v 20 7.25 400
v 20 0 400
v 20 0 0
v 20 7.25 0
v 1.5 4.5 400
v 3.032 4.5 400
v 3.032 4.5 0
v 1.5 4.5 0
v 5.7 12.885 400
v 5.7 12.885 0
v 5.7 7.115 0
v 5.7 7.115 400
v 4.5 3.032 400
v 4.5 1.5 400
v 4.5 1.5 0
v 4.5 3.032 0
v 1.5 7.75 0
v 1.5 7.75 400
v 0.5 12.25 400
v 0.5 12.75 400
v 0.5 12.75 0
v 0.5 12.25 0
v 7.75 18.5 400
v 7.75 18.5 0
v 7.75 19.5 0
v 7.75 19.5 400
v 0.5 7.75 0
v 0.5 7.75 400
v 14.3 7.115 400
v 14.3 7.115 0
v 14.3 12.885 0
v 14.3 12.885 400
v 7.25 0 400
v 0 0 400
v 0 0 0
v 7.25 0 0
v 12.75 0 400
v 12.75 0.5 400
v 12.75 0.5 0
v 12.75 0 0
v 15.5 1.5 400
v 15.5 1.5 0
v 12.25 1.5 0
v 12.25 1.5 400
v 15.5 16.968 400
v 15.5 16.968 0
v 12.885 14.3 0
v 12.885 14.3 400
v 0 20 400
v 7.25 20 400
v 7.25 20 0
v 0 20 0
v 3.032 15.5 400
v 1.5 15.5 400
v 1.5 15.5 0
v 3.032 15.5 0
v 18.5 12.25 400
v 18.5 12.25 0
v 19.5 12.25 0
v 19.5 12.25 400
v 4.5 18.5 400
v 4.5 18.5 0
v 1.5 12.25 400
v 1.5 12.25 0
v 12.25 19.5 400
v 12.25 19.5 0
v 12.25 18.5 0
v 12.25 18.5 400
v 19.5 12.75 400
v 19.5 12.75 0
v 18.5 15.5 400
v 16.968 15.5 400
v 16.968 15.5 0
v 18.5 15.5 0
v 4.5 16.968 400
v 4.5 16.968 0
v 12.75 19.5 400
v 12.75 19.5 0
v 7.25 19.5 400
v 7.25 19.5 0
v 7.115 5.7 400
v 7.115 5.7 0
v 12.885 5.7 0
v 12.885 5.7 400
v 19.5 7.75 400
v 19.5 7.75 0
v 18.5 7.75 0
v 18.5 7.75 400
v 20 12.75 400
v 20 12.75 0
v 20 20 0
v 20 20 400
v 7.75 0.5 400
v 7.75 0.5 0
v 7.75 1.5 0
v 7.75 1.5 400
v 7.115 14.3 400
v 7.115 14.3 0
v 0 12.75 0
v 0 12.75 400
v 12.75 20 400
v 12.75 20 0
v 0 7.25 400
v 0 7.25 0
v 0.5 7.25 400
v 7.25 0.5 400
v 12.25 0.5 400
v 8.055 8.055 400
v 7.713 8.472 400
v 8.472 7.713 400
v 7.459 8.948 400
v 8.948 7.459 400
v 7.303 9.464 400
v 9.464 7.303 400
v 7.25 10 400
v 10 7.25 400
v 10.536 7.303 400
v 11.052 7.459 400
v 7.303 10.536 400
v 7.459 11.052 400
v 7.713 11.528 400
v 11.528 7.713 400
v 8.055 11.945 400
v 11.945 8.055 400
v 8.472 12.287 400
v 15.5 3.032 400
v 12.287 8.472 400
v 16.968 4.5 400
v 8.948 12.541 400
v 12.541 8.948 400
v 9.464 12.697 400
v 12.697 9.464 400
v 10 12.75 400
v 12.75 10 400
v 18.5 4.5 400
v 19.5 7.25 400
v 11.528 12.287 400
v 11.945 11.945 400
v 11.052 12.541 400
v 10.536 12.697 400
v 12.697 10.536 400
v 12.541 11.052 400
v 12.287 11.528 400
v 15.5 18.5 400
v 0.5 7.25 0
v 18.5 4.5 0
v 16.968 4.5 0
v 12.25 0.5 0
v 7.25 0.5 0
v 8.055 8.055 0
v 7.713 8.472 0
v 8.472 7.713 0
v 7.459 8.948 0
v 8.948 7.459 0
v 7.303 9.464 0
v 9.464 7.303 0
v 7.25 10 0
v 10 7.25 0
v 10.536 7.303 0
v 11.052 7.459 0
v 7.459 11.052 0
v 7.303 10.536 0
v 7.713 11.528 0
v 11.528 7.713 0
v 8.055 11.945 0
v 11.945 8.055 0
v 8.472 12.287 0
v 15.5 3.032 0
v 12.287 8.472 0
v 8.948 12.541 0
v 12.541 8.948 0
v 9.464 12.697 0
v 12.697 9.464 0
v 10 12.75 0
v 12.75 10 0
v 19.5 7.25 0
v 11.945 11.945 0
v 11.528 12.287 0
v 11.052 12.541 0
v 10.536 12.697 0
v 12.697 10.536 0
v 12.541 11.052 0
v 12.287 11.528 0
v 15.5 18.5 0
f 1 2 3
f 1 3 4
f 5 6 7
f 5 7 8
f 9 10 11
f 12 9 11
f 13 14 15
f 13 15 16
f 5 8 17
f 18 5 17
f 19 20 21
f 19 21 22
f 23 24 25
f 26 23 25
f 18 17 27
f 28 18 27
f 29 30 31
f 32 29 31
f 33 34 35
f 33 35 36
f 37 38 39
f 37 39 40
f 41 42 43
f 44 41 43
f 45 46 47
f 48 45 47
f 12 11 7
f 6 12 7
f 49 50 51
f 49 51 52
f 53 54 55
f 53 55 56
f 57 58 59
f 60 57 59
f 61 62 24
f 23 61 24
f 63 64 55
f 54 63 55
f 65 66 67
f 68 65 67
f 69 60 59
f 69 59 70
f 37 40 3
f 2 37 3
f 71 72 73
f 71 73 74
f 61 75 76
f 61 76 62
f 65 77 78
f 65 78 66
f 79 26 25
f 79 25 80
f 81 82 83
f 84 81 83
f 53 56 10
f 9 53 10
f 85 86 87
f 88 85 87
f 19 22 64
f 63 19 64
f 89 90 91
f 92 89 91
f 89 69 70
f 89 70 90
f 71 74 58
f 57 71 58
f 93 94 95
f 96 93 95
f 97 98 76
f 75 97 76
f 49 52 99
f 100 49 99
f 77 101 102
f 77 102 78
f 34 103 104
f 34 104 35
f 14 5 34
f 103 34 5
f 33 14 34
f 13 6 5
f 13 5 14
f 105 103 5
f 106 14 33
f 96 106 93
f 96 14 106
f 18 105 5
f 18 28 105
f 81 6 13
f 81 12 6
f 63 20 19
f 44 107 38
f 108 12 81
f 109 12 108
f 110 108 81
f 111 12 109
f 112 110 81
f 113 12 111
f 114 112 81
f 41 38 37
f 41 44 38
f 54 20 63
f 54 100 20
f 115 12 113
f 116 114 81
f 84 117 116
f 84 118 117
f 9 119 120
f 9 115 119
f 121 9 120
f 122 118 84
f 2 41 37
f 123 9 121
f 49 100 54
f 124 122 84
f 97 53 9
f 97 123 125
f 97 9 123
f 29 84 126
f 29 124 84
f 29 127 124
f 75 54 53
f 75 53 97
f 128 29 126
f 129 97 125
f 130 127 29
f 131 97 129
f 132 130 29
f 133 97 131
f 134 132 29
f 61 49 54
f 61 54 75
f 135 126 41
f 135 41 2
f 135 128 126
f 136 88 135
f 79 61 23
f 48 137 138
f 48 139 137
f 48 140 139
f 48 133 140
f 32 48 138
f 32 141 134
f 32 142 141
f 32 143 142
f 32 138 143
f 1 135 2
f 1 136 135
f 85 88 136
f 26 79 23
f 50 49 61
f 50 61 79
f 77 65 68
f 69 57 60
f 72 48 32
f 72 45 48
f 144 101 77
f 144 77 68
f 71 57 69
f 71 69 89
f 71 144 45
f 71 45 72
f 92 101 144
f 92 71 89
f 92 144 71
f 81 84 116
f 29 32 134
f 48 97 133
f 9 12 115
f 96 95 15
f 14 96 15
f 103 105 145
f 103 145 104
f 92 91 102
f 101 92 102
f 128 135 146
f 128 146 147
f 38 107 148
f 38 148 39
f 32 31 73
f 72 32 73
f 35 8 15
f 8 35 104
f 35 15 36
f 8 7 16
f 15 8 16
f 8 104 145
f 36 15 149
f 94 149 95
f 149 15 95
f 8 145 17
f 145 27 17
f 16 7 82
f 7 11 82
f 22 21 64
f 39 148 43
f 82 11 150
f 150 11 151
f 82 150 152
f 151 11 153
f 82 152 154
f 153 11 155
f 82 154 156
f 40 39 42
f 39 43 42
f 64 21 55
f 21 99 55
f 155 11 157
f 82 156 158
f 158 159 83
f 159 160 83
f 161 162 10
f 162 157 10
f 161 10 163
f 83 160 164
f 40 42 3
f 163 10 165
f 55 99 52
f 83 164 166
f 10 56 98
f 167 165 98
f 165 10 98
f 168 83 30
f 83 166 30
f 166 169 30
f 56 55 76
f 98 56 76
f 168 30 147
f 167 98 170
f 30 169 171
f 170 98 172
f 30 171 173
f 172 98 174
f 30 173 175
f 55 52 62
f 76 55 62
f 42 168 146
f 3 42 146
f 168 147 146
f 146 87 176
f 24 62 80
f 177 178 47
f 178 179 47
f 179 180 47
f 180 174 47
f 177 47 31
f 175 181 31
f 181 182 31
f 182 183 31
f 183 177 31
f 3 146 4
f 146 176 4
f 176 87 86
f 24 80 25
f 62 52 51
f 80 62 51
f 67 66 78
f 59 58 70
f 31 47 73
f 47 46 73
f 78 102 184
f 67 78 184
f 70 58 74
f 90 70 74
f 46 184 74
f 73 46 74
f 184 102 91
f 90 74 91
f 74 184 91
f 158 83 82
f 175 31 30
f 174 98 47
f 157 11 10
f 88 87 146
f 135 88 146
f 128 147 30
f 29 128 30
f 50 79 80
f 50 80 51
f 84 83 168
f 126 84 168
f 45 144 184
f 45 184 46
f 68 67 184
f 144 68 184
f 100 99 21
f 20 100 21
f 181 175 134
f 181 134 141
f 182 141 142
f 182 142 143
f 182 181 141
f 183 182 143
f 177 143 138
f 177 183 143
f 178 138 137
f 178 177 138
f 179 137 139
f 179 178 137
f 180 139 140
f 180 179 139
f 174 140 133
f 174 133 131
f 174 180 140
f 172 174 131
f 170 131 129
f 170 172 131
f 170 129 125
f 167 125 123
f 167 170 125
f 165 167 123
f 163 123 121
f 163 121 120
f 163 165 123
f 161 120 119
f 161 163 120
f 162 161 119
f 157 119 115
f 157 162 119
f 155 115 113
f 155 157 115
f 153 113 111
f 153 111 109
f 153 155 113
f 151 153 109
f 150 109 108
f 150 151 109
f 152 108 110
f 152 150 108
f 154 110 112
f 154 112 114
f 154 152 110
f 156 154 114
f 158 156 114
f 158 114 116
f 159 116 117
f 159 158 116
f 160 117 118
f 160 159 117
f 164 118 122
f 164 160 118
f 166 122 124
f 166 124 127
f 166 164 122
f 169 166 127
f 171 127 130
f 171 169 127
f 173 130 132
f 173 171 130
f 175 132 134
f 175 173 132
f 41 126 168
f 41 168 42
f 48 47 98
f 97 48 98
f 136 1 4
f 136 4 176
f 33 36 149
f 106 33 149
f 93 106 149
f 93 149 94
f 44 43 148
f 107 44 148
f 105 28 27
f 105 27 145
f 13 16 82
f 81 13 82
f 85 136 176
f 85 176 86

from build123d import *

# Parameters (mm, degrees)
F0_R     = 2.75
F1_DEPTH = 400


with BuildPart() as f1:
    # F0 (on Top) → F1 (new body)
    with BuildSketch(Plane.XY):
        Polygon((0, 7.25), (0, 0), (7.25, 0), (7.25, 0.5), (7.75, 0.5), (7.75, 1.5), (4.5, 1.5), (4.5, 3.032238), (7.114553, 5.70033), (10, 5.70033), (12.885447, 5.70033), (15.5, 3.032238), (15.5, 1.5), (12.25, 1.5), (12.25, 0.5), (12.75, 0.5), (12.75, 0), (20, 0), (20, 7.25), (19.5, 7.25), (19.5, 7.75), (18.5, 7.75), (18.5, 4.5), (16.967762, 4.5), (14.29967, 7.114553), (14.29967, 10), (14.29967, 12.885447), (16.967762, 15.5), (18.5, 15.5), (18.5, 12.25), (19.5, 12.25), (19.5, 12.75), (20, 12.75), (20, 20), (12.75, 20), (12.75, 19.5), (12.25, 19.5), (12.25, 18.5), (15.5, 18.5), (15.5, 16.967762), (12.885447, 14.29967), (10, 14.29967), (7.114553, 14.29967), (4.5, 16.967762), (4.5, 18.5), (7.75, 18.5), (7.75, 19.5), (7.25, 19.5), (7.25, 20), (0, 20), (0, 12.75), (0.5, 12.75), (0.5, 12.25), (1.5, 12.25), (1.5, 15.5), (3.032238, 15.5), (5.70033, 12.885447), (5.70033, 10), (5.70033, 7.114553), (3.032238, 4.5), (1.5, 4.5), (1.5, 7.75), (0.5, 7.75), (0.5, 7.25), align=None)
        with Locations((10, 10)):
            Circle(F0_R, mode=Mode.SUBTRACT)
    extrude(amount=F1_DEPTH)


solid = f1.part
